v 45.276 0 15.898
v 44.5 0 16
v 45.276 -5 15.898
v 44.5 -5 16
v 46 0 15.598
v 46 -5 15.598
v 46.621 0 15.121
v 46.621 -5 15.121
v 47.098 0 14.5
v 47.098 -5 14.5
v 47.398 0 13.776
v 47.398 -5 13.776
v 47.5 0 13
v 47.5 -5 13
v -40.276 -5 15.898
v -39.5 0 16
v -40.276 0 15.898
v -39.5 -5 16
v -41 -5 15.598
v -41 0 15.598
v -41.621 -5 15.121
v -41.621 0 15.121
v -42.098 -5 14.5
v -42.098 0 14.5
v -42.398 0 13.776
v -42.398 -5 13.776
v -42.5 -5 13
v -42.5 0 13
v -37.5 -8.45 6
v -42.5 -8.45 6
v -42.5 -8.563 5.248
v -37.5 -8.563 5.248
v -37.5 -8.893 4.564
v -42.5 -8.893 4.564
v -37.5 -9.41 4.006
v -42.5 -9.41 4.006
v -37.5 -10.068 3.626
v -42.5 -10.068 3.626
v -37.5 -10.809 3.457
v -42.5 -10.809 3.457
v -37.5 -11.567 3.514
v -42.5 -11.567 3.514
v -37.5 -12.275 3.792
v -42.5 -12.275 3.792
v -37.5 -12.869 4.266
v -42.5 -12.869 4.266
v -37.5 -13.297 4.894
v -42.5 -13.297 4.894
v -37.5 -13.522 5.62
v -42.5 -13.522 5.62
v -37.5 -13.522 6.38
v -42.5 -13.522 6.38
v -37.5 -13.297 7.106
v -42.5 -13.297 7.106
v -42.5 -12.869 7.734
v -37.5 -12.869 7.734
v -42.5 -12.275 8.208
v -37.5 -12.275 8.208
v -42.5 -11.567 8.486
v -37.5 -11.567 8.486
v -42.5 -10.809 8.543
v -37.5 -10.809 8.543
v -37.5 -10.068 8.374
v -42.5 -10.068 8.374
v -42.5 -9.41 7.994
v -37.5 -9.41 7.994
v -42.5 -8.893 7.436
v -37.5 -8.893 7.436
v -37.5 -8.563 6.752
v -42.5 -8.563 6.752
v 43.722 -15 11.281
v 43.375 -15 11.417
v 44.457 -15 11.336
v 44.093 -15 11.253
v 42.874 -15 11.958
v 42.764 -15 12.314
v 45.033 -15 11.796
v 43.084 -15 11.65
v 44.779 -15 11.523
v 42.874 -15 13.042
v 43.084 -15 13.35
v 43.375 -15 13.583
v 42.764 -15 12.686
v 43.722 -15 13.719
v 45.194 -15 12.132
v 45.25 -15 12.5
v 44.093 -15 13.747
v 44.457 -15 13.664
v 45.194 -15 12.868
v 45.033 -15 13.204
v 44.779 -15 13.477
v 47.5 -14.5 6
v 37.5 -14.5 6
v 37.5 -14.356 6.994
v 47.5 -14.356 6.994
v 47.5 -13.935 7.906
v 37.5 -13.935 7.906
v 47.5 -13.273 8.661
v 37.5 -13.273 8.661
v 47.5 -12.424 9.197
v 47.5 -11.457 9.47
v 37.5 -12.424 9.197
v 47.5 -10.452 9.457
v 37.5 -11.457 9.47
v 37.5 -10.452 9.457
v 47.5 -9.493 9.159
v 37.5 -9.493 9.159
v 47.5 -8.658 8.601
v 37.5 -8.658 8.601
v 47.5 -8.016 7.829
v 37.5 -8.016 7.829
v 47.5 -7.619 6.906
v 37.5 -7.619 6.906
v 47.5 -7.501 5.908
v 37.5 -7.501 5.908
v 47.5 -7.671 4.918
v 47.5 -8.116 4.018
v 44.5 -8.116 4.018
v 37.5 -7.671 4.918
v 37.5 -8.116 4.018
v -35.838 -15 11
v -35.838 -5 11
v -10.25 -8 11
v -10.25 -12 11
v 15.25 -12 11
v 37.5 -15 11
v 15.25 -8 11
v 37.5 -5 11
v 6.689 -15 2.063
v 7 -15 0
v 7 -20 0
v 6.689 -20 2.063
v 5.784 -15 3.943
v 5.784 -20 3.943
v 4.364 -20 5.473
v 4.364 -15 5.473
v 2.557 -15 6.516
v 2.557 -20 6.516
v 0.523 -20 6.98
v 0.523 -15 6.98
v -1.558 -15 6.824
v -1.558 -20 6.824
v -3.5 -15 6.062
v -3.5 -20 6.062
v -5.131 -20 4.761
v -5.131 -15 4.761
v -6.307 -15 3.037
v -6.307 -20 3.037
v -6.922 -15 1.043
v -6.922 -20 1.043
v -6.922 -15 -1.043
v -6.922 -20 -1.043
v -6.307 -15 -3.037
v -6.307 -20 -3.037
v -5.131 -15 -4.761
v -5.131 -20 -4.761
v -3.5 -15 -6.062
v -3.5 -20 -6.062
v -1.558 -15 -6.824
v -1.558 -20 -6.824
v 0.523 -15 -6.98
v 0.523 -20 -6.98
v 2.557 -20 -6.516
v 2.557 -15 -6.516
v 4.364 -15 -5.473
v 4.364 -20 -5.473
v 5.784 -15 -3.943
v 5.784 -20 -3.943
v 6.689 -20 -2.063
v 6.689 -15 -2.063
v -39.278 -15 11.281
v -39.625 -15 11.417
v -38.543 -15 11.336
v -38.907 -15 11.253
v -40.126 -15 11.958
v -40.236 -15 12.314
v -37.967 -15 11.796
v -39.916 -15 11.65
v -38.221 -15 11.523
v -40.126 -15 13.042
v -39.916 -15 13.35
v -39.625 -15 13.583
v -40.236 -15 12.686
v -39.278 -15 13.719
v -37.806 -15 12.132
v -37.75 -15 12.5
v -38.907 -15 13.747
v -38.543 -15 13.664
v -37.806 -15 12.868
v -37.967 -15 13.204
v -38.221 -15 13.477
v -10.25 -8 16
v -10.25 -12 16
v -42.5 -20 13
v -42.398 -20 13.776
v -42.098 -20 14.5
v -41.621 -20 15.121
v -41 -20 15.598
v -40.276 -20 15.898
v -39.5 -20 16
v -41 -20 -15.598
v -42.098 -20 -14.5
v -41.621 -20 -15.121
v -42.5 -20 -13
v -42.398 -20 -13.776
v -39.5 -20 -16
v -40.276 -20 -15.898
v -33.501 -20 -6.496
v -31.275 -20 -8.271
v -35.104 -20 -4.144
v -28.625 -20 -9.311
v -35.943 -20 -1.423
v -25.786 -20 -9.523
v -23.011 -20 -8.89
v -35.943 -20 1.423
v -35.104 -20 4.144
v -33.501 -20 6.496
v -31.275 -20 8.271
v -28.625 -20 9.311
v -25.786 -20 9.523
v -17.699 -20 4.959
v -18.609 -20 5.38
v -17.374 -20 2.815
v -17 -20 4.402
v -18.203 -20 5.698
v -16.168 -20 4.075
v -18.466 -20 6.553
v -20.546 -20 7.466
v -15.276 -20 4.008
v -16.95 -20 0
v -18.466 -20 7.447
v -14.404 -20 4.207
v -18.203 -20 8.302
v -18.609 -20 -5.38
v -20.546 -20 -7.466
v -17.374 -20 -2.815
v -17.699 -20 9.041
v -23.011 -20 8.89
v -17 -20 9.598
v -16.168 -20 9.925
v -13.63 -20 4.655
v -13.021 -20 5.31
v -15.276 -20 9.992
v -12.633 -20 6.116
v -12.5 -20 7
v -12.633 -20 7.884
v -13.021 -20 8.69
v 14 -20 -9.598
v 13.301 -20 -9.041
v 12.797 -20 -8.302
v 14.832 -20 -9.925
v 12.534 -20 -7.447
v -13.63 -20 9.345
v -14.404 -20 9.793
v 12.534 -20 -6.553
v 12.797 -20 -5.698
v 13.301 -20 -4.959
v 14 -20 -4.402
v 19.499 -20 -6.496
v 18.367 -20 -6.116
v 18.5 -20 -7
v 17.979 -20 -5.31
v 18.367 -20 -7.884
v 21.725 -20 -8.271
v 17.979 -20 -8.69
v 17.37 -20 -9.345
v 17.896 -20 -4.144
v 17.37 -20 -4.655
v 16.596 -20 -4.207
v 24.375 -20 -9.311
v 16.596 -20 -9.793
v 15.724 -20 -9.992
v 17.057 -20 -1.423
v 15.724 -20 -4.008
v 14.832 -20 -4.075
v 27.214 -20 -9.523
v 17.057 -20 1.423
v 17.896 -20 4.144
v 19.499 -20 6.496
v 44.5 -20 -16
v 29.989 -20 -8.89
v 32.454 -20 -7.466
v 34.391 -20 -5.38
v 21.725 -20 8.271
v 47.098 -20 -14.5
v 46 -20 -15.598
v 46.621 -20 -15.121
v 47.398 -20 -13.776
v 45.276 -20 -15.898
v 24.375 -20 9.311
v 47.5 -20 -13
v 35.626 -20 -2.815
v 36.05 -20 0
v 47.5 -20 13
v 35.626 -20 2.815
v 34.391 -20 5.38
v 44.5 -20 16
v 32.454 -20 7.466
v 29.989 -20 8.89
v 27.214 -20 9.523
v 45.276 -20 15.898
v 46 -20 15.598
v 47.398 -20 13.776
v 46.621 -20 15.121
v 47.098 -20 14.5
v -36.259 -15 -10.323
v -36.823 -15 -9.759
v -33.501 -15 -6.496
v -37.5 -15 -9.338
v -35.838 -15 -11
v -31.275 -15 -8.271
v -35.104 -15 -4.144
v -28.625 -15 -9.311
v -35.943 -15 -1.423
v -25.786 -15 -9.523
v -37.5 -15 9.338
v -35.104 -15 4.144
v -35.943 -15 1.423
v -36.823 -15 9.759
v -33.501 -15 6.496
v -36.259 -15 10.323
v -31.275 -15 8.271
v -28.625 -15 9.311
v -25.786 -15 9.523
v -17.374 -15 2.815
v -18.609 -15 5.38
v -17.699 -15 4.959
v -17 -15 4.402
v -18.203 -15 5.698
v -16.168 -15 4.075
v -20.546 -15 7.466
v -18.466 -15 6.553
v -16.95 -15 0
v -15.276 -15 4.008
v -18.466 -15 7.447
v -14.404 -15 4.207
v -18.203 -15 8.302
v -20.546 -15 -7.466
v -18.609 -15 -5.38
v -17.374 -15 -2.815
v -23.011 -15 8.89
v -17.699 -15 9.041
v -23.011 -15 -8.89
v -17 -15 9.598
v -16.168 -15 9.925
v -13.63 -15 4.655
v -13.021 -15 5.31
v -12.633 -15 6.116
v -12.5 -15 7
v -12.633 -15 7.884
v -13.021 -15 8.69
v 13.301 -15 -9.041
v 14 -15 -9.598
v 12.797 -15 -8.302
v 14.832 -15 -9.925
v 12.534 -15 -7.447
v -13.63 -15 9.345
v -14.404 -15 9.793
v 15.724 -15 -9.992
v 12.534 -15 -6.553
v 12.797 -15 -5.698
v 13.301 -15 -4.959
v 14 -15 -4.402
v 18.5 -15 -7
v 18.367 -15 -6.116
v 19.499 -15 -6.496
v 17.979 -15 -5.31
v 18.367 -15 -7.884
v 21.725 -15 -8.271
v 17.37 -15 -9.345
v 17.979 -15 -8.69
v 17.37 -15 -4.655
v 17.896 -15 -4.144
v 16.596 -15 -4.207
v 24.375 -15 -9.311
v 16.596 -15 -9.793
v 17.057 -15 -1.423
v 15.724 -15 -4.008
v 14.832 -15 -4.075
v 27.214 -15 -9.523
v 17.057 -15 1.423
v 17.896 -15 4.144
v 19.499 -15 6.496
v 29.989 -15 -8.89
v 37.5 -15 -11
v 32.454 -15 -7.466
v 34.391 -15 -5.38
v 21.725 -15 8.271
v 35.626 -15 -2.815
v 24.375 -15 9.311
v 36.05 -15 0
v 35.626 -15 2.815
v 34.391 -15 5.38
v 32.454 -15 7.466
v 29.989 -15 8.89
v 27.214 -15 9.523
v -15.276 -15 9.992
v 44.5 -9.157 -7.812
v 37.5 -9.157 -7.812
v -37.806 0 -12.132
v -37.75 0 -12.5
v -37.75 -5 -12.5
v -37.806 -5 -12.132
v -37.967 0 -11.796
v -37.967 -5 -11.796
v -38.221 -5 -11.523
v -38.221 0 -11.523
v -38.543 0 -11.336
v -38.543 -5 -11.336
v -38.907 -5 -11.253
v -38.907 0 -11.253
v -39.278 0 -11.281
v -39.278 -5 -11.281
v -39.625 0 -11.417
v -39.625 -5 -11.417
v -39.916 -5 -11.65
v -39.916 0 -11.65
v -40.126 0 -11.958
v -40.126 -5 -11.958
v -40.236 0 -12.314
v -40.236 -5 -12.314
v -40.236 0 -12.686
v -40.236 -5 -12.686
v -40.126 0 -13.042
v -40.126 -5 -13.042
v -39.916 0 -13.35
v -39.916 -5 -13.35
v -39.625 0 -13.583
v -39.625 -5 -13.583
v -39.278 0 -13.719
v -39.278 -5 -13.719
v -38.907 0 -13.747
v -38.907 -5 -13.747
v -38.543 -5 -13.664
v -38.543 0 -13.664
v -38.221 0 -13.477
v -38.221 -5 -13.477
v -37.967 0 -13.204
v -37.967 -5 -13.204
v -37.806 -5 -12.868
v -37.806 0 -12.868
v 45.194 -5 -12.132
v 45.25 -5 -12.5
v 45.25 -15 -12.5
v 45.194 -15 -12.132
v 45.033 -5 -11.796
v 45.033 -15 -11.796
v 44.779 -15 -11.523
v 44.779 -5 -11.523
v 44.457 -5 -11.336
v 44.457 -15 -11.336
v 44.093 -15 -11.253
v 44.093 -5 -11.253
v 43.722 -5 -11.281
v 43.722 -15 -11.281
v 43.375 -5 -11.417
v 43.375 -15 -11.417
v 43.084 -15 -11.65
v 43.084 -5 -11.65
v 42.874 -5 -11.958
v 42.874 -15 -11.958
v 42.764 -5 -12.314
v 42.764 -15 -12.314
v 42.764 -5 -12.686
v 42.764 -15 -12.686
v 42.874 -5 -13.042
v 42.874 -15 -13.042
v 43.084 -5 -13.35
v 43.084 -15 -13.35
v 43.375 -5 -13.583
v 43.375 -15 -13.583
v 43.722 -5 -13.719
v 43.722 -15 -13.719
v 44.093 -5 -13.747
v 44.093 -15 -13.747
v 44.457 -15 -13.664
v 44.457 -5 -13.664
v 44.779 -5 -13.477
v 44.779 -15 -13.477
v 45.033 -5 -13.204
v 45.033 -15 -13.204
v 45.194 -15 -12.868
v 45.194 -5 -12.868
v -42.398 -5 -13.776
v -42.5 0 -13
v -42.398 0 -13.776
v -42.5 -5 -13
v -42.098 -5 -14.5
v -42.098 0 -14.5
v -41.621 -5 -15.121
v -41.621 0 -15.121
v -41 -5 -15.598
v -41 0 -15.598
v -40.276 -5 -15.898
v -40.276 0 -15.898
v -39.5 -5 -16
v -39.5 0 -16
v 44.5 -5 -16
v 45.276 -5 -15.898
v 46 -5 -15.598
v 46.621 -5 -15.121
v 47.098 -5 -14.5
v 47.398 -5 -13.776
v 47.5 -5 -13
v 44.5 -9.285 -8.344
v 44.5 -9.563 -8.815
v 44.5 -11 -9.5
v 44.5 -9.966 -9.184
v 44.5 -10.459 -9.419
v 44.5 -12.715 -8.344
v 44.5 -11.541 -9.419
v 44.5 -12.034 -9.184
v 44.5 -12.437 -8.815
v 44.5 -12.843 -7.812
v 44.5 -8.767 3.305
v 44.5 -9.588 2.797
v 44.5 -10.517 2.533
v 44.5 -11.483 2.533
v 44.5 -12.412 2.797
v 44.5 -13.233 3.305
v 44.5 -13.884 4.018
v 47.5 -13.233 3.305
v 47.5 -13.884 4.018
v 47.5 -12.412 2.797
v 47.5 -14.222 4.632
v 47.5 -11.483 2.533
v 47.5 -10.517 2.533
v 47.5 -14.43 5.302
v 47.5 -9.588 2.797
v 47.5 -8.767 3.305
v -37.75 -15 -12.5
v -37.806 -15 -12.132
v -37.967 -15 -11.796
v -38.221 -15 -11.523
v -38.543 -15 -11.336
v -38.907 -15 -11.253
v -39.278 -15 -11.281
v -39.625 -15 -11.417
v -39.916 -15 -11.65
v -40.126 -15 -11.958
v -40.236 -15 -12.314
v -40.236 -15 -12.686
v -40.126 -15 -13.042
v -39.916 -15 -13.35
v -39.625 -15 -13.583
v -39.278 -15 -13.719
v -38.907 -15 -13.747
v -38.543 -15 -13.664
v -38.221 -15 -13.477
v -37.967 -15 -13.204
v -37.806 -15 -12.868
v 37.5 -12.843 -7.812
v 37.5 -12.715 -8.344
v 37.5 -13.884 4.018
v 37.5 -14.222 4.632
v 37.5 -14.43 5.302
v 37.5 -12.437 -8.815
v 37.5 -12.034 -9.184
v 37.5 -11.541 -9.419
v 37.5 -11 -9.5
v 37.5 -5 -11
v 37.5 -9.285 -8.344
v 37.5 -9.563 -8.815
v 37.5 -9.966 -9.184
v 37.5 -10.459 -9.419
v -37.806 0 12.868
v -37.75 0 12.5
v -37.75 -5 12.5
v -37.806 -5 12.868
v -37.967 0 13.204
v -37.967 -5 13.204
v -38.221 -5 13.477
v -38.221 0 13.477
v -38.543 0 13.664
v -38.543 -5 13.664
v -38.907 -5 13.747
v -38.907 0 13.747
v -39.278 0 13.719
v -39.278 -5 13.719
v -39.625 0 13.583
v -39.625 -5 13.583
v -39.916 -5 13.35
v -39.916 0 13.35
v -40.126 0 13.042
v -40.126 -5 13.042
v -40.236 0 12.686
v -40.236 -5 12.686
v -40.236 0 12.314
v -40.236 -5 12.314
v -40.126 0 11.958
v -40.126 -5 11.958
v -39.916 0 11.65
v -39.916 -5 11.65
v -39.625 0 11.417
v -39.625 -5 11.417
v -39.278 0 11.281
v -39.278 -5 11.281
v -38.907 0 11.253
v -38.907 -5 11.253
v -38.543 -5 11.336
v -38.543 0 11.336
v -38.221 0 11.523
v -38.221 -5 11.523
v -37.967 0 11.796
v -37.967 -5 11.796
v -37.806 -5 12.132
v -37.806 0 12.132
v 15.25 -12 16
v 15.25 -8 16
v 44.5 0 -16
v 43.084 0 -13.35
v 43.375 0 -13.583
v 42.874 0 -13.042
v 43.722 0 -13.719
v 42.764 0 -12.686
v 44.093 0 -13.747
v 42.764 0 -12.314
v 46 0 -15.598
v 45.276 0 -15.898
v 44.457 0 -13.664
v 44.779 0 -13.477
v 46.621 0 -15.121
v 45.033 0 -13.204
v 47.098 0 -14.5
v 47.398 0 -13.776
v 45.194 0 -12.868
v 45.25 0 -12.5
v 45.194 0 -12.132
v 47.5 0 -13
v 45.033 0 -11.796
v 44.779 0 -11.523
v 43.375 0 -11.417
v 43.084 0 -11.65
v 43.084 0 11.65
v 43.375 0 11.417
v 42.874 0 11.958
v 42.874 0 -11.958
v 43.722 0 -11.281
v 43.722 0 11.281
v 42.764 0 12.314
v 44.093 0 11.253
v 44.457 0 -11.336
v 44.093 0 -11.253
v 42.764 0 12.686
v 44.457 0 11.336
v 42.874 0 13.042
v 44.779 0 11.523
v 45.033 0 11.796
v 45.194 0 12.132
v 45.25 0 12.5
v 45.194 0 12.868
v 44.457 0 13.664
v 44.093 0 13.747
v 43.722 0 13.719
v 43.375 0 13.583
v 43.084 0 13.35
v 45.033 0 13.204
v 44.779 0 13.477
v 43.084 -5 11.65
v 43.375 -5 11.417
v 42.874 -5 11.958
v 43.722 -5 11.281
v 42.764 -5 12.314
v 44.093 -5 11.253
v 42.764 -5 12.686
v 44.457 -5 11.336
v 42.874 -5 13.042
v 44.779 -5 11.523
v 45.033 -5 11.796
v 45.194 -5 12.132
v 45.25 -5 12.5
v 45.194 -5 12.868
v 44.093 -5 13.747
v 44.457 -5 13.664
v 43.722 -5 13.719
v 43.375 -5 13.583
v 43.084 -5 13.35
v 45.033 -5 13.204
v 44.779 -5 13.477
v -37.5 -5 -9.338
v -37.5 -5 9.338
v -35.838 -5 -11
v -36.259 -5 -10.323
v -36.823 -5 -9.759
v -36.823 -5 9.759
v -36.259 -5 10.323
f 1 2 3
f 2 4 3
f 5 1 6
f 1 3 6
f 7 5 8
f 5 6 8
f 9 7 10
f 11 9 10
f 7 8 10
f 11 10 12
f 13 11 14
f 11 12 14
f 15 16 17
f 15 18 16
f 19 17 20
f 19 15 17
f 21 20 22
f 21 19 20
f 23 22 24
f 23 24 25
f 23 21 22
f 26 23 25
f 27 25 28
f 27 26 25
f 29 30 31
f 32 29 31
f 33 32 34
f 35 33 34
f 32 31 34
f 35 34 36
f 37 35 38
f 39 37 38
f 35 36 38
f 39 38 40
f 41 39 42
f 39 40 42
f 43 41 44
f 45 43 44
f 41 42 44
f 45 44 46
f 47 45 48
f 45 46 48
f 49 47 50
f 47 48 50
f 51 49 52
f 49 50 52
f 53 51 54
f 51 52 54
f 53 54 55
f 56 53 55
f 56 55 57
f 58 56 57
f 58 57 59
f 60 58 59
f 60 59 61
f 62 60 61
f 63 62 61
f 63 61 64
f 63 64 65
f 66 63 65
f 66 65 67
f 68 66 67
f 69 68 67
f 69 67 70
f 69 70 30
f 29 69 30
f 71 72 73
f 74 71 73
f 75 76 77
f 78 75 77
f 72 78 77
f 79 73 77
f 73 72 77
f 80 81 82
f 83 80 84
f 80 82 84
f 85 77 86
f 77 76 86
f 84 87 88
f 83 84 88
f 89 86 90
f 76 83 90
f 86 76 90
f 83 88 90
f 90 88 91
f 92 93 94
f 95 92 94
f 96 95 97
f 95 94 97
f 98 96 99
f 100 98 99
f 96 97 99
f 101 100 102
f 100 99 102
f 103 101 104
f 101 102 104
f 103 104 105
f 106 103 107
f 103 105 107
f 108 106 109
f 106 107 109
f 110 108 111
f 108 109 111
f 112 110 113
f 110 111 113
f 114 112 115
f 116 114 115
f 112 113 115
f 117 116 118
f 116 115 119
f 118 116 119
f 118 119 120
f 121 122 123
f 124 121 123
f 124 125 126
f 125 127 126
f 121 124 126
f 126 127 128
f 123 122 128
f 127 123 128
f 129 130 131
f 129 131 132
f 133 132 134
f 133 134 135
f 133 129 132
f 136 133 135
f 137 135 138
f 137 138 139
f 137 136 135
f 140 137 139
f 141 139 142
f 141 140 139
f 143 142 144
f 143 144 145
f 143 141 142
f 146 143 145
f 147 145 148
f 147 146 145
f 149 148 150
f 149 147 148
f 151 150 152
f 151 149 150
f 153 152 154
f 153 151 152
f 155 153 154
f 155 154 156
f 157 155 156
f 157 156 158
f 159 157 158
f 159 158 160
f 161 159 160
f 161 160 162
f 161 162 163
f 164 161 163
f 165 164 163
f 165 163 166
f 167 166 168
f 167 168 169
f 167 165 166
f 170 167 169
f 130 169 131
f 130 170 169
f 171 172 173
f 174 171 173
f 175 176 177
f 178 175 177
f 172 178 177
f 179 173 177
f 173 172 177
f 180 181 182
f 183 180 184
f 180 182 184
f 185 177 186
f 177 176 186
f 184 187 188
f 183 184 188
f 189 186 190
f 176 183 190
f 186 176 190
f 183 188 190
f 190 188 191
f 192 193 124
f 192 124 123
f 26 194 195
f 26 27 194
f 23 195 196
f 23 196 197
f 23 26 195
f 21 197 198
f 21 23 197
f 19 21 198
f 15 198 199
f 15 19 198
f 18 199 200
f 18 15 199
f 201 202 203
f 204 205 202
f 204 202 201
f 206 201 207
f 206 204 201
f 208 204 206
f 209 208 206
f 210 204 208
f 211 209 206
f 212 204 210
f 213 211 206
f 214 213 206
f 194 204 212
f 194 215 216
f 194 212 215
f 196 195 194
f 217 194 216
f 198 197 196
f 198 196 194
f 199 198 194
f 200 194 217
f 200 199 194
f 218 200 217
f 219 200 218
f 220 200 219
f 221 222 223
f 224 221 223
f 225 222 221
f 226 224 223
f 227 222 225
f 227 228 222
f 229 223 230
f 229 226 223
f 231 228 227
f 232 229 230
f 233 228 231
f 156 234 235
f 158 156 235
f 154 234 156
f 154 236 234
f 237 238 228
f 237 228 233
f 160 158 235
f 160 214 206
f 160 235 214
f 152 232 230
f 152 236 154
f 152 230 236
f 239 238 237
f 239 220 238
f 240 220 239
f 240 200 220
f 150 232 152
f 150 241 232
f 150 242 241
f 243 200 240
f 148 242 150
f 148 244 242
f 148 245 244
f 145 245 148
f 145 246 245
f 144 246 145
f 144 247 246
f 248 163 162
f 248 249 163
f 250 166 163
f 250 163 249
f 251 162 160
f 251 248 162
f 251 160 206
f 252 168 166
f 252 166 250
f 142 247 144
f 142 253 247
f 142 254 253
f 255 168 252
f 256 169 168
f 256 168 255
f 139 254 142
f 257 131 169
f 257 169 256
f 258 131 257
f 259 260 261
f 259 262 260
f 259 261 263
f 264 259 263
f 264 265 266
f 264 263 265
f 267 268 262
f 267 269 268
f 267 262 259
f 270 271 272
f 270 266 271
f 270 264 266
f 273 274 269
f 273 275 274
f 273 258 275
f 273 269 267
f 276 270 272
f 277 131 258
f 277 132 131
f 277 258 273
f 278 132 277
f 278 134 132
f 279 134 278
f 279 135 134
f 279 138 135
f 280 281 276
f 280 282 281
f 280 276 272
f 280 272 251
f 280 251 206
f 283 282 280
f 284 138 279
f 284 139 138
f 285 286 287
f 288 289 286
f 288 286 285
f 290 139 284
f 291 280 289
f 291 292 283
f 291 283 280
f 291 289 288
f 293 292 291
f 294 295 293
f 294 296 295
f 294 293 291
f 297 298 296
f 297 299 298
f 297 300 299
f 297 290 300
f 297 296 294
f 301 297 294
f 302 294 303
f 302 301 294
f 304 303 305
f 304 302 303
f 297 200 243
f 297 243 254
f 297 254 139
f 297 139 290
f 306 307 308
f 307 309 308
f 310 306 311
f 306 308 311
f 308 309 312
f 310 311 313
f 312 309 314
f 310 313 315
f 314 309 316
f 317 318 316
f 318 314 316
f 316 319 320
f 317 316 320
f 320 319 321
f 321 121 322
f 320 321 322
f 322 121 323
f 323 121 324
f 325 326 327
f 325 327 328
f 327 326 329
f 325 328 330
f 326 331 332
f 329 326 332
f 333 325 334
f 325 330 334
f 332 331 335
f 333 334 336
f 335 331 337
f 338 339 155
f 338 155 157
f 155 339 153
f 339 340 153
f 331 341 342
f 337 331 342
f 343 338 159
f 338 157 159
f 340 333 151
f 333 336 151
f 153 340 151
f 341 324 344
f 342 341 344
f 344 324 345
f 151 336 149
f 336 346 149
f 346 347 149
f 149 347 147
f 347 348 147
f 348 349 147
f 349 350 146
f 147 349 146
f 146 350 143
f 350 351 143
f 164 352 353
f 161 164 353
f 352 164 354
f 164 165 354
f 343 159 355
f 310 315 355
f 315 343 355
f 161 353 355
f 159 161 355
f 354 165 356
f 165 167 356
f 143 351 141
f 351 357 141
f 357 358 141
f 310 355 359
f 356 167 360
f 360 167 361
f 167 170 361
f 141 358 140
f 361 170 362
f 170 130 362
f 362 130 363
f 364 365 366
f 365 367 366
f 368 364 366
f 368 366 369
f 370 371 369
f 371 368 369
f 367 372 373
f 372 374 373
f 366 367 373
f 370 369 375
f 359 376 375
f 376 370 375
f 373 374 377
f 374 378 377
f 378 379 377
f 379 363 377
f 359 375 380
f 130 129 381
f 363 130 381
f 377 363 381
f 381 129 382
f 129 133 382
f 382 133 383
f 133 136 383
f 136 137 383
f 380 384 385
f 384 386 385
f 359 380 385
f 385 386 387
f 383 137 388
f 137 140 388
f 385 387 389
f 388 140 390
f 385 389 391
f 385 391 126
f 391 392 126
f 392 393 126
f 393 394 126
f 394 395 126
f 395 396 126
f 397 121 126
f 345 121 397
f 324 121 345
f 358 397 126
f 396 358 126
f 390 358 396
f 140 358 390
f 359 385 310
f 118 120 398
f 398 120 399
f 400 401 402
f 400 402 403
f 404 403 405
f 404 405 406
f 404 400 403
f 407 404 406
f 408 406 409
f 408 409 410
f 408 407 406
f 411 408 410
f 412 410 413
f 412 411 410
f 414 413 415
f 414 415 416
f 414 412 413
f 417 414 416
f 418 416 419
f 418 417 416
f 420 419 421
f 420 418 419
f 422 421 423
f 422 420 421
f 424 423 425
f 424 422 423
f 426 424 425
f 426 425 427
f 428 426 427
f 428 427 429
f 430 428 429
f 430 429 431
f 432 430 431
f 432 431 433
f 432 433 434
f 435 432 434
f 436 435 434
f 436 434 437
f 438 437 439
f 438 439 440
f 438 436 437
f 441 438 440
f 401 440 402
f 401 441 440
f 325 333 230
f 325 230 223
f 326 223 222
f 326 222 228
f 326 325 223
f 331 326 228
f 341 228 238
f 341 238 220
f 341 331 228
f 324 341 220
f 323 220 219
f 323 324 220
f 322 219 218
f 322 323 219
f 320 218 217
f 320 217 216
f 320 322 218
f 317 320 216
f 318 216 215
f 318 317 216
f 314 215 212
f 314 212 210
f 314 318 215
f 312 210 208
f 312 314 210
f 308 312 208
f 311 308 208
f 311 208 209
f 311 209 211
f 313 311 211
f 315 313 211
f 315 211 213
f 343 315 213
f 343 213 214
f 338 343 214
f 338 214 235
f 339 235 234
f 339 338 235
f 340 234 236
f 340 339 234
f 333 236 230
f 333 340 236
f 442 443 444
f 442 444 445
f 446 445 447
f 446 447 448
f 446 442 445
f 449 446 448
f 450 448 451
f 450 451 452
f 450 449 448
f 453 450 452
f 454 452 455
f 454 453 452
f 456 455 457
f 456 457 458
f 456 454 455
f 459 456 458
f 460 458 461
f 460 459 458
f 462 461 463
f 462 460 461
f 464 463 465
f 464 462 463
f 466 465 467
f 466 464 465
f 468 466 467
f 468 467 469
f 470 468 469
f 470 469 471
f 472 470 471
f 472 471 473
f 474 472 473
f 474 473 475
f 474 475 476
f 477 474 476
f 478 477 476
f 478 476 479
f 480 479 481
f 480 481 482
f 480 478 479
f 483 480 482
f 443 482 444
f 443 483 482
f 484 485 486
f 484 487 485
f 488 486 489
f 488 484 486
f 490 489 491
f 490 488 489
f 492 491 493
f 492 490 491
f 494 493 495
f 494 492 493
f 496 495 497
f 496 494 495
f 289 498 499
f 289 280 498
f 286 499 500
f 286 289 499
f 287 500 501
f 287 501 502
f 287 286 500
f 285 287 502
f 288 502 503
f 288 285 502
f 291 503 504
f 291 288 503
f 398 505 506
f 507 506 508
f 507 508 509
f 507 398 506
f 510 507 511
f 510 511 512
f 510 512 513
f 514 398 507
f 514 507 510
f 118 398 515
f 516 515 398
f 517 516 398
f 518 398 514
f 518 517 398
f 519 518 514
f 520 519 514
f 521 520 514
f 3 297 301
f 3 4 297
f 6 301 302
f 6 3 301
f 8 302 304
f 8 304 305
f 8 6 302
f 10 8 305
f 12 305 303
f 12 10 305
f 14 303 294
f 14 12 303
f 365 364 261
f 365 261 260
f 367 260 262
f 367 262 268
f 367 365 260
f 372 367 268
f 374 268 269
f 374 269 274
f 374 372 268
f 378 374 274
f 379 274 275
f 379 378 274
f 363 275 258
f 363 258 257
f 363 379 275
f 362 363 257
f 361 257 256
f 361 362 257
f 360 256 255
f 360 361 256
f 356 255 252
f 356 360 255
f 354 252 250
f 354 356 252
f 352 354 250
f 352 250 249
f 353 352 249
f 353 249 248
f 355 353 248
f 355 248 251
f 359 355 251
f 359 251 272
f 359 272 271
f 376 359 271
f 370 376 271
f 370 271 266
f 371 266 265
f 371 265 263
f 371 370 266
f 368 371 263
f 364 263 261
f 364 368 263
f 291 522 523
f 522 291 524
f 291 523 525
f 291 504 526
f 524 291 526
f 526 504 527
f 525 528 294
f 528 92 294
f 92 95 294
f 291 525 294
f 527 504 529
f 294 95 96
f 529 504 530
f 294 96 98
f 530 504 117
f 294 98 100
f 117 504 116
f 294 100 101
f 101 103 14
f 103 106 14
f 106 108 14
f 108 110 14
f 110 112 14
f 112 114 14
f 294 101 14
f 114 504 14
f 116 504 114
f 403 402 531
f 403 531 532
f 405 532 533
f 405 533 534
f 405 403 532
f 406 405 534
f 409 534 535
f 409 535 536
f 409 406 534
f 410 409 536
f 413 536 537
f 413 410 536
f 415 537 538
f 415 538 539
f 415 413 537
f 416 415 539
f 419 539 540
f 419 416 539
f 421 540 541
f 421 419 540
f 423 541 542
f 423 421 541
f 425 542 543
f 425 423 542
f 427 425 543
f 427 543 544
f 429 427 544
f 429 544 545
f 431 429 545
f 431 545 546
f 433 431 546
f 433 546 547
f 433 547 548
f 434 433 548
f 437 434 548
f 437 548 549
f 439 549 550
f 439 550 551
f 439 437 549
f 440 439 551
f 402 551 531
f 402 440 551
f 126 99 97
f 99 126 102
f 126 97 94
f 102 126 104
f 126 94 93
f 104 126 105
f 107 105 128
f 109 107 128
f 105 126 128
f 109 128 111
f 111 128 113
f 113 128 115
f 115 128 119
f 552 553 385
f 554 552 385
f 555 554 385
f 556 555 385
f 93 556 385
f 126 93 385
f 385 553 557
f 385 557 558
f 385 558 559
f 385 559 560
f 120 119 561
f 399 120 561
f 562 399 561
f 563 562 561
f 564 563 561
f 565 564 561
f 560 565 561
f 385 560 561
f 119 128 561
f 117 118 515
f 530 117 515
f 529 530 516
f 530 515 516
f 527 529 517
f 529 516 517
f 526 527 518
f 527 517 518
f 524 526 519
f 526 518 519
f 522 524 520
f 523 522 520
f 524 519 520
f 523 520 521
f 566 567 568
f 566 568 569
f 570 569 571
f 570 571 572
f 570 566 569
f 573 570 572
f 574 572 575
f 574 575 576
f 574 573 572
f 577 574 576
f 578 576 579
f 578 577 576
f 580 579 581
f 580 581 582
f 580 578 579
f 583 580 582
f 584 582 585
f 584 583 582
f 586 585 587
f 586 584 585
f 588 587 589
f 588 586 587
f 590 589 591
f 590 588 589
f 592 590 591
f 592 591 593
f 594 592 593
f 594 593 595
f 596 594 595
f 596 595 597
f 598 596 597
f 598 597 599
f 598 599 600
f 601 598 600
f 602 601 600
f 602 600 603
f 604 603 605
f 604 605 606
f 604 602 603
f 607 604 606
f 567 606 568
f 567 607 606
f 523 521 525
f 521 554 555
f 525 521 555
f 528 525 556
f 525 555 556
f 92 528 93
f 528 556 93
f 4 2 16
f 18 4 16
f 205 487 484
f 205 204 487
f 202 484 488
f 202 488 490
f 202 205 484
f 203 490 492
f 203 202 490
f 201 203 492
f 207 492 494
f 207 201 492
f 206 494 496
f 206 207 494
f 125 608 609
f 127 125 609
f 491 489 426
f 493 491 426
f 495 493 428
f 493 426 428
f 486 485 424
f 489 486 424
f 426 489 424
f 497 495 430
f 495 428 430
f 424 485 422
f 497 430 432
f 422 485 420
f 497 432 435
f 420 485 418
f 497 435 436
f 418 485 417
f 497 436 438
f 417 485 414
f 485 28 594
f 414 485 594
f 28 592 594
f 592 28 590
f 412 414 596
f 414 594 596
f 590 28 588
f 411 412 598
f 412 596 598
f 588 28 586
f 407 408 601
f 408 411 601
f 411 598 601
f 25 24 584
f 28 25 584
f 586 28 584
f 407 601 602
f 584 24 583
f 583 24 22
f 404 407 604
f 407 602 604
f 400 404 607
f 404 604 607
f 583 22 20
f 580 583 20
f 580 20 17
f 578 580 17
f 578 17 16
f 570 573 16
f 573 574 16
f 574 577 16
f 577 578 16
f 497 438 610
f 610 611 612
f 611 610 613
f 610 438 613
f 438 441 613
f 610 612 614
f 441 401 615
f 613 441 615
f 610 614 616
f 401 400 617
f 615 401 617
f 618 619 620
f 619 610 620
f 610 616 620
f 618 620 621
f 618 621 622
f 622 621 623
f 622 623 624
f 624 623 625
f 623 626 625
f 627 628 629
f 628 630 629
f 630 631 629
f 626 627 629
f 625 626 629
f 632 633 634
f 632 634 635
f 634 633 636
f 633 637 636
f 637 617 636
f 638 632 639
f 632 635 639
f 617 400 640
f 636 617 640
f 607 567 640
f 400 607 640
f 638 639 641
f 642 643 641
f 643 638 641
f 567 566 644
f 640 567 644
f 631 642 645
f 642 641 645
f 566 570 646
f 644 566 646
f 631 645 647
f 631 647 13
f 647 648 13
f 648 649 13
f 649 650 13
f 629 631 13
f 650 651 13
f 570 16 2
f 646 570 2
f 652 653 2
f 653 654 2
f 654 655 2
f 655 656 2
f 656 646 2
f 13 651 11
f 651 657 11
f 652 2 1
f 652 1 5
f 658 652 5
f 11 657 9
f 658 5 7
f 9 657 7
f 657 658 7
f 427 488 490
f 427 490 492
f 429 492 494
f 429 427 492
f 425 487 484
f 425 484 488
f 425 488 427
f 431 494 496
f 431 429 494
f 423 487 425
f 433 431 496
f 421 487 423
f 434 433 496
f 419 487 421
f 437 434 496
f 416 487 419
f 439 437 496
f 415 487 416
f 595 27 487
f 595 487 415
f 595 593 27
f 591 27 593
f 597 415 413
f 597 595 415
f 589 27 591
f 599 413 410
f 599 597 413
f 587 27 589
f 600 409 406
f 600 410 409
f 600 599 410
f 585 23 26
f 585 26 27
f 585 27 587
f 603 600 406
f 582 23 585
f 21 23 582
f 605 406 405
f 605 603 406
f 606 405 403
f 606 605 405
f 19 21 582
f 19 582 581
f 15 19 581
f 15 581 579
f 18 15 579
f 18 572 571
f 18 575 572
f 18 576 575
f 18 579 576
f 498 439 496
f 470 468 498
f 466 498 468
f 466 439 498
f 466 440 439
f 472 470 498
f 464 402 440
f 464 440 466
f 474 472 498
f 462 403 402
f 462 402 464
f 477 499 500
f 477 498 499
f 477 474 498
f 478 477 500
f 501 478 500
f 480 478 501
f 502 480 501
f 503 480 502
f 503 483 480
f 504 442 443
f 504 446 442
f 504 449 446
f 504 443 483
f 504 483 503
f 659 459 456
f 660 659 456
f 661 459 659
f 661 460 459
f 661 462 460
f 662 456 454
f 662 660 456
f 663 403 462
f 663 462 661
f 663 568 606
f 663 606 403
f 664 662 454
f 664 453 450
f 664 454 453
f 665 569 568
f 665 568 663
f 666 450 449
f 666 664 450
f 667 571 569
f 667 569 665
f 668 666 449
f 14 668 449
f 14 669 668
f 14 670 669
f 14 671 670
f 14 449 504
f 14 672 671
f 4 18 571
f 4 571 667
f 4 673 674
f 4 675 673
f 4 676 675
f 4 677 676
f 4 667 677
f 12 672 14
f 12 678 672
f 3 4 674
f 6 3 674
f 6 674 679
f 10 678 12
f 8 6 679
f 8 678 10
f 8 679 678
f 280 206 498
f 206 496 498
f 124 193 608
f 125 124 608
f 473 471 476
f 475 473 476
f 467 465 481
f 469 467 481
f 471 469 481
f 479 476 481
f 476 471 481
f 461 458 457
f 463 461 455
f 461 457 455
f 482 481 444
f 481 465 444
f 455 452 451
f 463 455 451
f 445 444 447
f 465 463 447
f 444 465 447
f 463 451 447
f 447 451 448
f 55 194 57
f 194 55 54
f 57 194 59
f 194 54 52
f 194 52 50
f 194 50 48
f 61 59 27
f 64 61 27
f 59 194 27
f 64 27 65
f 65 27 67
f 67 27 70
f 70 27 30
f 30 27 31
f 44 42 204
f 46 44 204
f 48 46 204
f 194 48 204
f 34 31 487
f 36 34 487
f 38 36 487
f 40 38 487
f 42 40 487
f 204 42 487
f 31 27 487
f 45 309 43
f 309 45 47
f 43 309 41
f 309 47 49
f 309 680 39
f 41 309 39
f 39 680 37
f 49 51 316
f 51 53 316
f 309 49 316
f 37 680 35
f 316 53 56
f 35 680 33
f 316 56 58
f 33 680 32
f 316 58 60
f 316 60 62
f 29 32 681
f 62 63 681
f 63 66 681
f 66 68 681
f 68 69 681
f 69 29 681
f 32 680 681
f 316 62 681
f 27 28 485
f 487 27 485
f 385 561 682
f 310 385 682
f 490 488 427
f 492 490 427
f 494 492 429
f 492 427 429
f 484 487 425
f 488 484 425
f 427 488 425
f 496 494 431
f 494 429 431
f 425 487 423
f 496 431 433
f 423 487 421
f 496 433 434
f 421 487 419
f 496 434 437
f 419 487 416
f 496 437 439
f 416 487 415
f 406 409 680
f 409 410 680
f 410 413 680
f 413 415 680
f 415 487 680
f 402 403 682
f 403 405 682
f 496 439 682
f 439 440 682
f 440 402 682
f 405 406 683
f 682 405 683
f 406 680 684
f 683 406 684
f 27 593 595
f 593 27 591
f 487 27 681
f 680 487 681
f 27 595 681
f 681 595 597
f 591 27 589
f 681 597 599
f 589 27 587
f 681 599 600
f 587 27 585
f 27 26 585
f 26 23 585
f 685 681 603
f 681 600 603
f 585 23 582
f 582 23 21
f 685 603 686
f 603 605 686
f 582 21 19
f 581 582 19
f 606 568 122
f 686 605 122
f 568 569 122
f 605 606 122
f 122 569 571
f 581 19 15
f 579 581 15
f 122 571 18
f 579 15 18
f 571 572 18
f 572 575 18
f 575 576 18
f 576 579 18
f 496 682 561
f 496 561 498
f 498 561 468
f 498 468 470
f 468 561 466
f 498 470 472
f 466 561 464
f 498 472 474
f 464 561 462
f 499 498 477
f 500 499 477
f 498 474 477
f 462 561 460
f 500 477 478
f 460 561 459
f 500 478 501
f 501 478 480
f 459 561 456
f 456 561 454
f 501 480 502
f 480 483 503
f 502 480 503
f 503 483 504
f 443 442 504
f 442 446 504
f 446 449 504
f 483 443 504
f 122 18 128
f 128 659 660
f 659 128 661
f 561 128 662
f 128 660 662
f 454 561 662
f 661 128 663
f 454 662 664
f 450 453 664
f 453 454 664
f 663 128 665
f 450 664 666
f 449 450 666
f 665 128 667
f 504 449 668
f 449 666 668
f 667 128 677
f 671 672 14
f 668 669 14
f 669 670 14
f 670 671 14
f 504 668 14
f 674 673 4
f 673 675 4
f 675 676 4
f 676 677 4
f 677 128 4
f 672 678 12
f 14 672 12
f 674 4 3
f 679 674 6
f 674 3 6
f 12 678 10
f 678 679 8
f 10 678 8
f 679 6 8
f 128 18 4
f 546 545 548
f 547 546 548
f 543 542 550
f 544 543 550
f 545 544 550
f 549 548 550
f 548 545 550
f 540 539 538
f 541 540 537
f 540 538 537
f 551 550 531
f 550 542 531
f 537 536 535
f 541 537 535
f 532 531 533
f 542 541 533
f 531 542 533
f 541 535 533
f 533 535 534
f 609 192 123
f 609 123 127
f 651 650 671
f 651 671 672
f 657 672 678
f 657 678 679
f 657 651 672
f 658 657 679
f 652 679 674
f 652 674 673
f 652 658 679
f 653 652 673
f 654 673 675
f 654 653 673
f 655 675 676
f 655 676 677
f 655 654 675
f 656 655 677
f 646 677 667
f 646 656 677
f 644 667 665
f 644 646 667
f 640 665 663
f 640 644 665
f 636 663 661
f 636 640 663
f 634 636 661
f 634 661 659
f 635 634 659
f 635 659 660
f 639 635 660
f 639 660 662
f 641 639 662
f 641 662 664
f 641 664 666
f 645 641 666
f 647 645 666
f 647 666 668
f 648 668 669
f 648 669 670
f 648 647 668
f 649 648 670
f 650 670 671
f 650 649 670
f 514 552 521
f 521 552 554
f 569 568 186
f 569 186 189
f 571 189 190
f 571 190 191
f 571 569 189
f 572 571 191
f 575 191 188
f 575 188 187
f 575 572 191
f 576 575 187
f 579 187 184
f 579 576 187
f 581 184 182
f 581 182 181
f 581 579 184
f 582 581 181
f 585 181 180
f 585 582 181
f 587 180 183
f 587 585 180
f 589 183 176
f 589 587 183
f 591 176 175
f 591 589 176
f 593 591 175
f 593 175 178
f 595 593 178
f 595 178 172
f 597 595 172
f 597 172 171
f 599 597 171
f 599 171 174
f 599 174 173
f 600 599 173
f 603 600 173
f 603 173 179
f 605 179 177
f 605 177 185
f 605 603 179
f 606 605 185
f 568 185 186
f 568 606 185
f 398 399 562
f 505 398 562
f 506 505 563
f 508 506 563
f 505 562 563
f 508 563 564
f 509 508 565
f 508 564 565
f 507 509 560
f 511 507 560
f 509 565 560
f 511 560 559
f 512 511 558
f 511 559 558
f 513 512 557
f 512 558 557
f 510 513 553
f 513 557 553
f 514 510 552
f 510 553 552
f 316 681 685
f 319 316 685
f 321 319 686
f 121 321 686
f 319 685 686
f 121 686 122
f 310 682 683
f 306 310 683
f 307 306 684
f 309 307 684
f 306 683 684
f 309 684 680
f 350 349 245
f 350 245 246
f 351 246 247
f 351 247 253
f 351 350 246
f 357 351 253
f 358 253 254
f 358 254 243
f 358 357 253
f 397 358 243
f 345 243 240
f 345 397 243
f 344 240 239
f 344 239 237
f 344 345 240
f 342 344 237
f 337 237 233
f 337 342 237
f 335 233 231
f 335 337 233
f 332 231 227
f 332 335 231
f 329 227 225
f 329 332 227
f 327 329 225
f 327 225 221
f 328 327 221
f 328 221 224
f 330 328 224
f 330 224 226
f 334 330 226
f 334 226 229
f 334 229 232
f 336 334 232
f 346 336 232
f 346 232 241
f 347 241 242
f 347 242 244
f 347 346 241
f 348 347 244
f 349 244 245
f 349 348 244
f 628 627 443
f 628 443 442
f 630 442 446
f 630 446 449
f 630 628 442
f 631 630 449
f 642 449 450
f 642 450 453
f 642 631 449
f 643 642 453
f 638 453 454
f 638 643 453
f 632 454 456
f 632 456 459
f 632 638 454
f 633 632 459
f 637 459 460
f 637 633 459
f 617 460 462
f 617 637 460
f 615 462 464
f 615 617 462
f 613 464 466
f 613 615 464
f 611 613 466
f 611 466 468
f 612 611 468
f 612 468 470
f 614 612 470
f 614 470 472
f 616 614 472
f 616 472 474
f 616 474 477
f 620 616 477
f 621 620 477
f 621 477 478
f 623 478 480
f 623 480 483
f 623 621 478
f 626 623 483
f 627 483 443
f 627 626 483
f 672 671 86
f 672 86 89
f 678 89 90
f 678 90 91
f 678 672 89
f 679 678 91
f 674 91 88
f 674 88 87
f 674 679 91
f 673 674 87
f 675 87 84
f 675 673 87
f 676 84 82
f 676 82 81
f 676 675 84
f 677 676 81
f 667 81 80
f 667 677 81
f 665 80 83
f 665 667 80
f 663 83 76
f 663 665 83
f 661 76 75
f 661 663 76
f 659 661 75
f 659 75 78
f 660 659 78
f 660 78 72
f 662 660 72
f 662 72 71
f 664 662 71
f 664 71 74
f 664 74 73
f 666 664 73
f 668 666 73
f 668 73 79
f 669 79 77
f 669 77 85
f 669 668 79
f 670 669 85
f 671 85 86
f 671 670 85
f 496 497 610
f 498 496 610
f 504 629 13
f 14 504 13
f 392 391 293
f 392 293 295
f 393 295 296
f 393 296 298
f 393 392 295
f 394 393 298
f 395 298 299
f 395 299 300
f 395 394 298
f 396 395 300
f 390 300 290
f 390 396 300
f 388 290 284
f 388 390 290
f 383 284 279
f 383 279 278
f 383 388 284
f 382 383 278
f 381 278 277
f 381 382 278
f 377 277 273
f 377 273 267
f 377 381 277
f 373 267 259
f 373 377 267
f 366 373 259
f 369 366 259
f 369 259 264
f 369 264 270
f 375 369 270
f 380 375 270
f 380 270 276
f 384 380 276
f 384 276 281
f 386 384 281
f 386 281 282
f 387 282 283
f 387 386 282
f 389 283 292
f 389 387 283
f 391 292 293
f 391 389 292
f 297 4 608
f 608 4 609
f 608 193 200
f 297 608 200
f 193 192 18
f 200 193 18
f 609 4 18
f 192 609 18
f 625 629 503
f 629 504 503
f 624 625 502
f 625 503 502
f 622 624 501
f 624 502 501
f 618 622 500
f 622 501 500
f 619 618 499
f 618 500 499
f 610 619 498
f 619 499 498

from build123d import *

# Parameters (mm, degrees)
F0_R      = 1.25
F1_DEPTH  = 5
F2_R      = 1.25
F3_DEPTH  = 10
F4_R      = 3
F4_R_2    = 9.55
F4_R_3    = 7
F5_DEPTH  = 5
F6_W      = 25.5
F6_H      = 4
F7_DEPTH  = 5
F8_R      = 3
F8_2_R    = 3
F10_DEPTH = 10
F11_DEPTH = 7
F12_D     = 5.1


# Not quite as in the source:
# - a feature names something its author has since deleted; it is built from what else it names


with BuildPart() as f1:
    # F0 (on Front) → F1 (new body)
    with BuildSketch(Plane.XZ):
        Polygon((47.5, 16), (42.5, 16), (-42.5, 16), (-42.5, -16), (42.5, -16), (47.5, -16), align=None)
        with Locations((-39, -12.5)):
            Circle(F0_R, mode=Mode.SUBTRACT)
        with Locations((44, -12.5)):
            Circle(F0_R, mode=Mode.SUBTRACT)
        with Locations((-39, 12.5)):
            Circle(F0_R, mode=Mode.SUBTRACT)
        with Locations((44, 12.5)):
            Circle(F0_R, mode=Mode.SUBTRACT)
    extrude(amount=F1_DEPTH)

    # F8#2
    f8_2_edges = [f1.edges().sort_by_distance(p)[0] for p in [
        (47.5, -2.5, 16),
        (47.5, -2.5, -16),
        (-42.5, -2.5, 16),
        (-42.5, -2.5, -16),
    ]]
    fillet(f8_2_edges, radius=F8_2_R)


with BuildPart() as f3:
    # F2 (on face) → F3 (new body)
    with BuildSketch(Plane.XZ.offset(5)):
        with BuildLine():
            ThreePointArc((-37.5, 9.3377223398), (-40.8708286934, 9.5419601085), (-42.5, 12.5))
            Line((-42.5, 12.5), (-42.5, -12.5))
            ThreePointArc((-42.5, -12.5), (-40.8708286934, -9.5419601085), (-37.5, -9.3377223398))
            Line((-37.5, -9.3377223398), (-37.5, 9.3377223398))
        make_face()
        with BuildLine():
            ThreePointArc((-35.5, 12.5), (-36.5251262658, 14.9748737342), (-39, 16))
            ThreePointArc((-39, 16), (-41.4748737342, 14.9748737342), (-42.5, 12.5))
            ThreePointArc((-42.5, 12.5), (-40.8708286934, 9.5419601085), (-37.5, 9.3377223398))
            Line((-37.5, 9.3377223398), (-37.5, 11))
            Line((-37.5, 11), (-35.8377223398, 11))
            ThreePointArc((-35.8377223398, 11), (-35.5854742781, 11.7312255892), (-35.5, 12.5))
        make_face()
        with Locations((-39, 12.5)):
            Circle(F2_R, mode=Mode.SUBTRACT)
        with BuildLine():
            Line((-39, 16), (-42.5, 16))
            Line((-42.5, 16), (-42.5, 12.5))
            ThreePointArc((-42.5, 12.5), (-41.4748737342, 14.9748737342), (-39, 16))
        make_face()
        with BuildLine():
            ThreePointArc((-39, -16), (-41.4748737342, -14.9748737342), (-42.5, -12.5))
            Line((-42.5, -12.5), (-42.5, -16))
            Line((-42.5, -16), (-39, -16))
        make_face()
        with BuildLine():
            ThreePointArc((-37.5, -9.3377223398), (-40.8708286934, -9.5419601085), (-42.5, -12.5))
            ThreePointArc((-42.5, -12.5), (-41.4748737342, -14.9748737342), (-39, -16))
            ThreePointArc((-39, -16), (-36.5251262658, -14.9748737342), (-35.5, -12.5))
            ThreePointArc((-35.5, -12.5), (-35.5854742781, -11.7312255892), (-35.8377223398, -11))
            Line((-35.8377223398, -11), (-37.5, -11))
            Line((-37.5, -11), (-37.5, -9.3377223398))
        make_face()
        with Locations((-39, -12.5)):
            Circle(F2_R, mode=Mode.SUBTRACT)
        with BuildLine():
            Line((42.5, 16), (-39, 16))
            ThreePointArc((-39, 16), (-36.5251262658, 14.9748737342), (-35.5, 12.5))
            ThreePointArc((-35.5, 12.5), (-35.5854742781, 11.7312255892), (-35.8377223398, 11))
            Line((-35.8377223398, 11), (37.5, 11))
            Line((37.5, 11), (37.5, -11))
            Line((37.5, -11), (-35.8377223398, -11))
            ThreePointArc((-35.8377223398, -11), (-35.5854742781, -11.7312255892), (-35.5, -12.5))
            ThreePointArc((-35.5, -12.5), (-36.5251262658, -14.9748737342), (-39, -16))
            Line((-39, -16), (42.5, -16))
            Line((42.5, -16), (47.5, -16))
            Line((47.5, -16), (47.5, 16))
            Line((47.5, 16), (42.5, 16))
        make_face()
        with Locations((44, -12.5)):
            Circle(F2_R, mode=Mode.SUBTRACT)
        with Locations((44, 12.5)):
            Circle(F2_R, mode=Mode.SUBTRACT)
        with BuildLine():
            Line((-37.5, 11), (-37.5, 9.3377223398))
            ThreePointArc((-37.5, 9.3377223398), (-36.5251262658, 10.0251262658), (-35.8377223398, 11))
            Line((-35.8377223398, 11), (-37.5, 11))
        make_face()
        with BuildLine():
            ThreePointArc((-35.8377223398, -11), (-36.5251262658, -10.0251262658), (-37.5, -9.3377223398))
            Line((-37.5, -9.3377223398), (-37.5, -11))
            Line((-37.5, -11), (-35.8377223398, -11))
        make_face()
    extrude(amount=F3_DEPTH)

    # F4 (on face) → F5 (join)
    with BuildSketch(Plane.XZ.offset(15)):
        Polygon((42.5, 16), (-42.5, 16), (-42.5, -16), (42.5, -16), (47.5, -16), (47.5, 16), align=None)
        with Locations((15.5, -7)):
            Circle(F4_R, mode=Mode.SUBTRACT)
        with Locations((-26.5, 0)):
            Circle(F4_R_2, mode=Mode.SUBTRACT)
        Circle(F4_R_3, mode=Mode.SUBTRACT)
        with Locations((-15.5, 7)):
            Circle(F4_R, mode=Mode.SUBTRACT)
        with Locations((26.5, 0)):
            Circle(F4_R_2, mode=Mode.SUBTRACT)
    extrude(amount=F5_DEPTH)

    # F6 (on face) → F7 (cut)
    with BuildSketch(Plane.XY.offset(16)):
        with Locations((2.5, -10)):
            Rectangle(F6_W, F6_H)
    extrude(amount=-F7_DEPTH, mode=Mode.SUBTRACT)

    # F8
    f8_edges = [f3.edges().sort_by_distance(p)[0] for p in [
        (47.5, -12.5, 16),
        (47.5, -12.5, -16),
        (-42.5, -12.5, 16),
        (-42.5, -12.5, -16),
    ]]
    fillet(f8_edges, radius=F8_R)

    # F9 (on face) → F10 (cut, through all)
    with BuildSketch(Plane(origin=(37.5, 0, 0), x_dir=(0, -1, 0), z_dir=(-1, 0, 0))):
        with BuildLine():
            ThreePointArc((13.8844104576, 4.0175327715), (14.3425616376, 4.9620781825), (14.5, 6))
            ThreePointArc((14.5, 6), (9.9620781825, 9.3425616376), (8.1155895424, 4.0175327715))
            ThreePointArc((8.1155895424, 4.0175327715), (11, 2.5), (13.8844104576, 4.0175327715))
        make_face()
    extrude(amount=-F10_DEPTH, mode=Mode.SUBTRACT)

    # F9 (on face) → F11 (cut)
    with BuildSketch(Plane(origin=(37.5, 0, 0), x_dir=(0, -1, 0), z_dir=(-1, 0, 0))):
        with BuildLine():
            ThreePointArc((13.8844104576, 4.0175327715), (14.3425616376, 4.9620781825), (14.5, 6))
            ThreePointArc((14.5, 6), (9.9620781825, 9.3425616376), (8.1155895424, 4.0175327715))
            ThreePointArc((8.1155895424, 4.0175327715), (11, 2.5), (13.8844104576, 4.0175327715))
        make_face()
        with BuildLine():
            ThreePointArc((13.8844104576, 4.0175327715), (11, 2.5), (8.1155895424, 4.0175327715))
            Line((8.1155895424, 4.0175327715), (9.1571289137, -7.8122533804))
            ThreePointArc((9.1571289137, -7.8122533804), (10.9187950419, -5.8017830877), (12.85, -7.65))
            ThreePointArc((12.85, -7.65), (12.8482169123, -7.7312049581), (12.8428710863, -7.8122533804))
            Line((12.8428710863, -7.8122533804), (13.8844104576, 4.0175327715))
        make_face()
        with BuildLine():
            Line((12.8428710863, -7.8122533804), (9.1571289137, -7.8122533804))
            ThreePointArc((9.1571289137, -7.8122533804), (11, -9.5), (12.8428710863, -7.8122533804))
        make_face()
        with BuildLine():
            ThreePointArc((12.85, -7.65), (10.9187950419, -5.8017830877), (9.1571289137, -7.8122533804))
            Line((9.1571289137, -7.8122533804), (12.8428710863, -7.8122533804))
            ThreePointArc((12.8428710863, -7.8122533804), (12.8482169123, -7.7312049581), (12.85, -7.65))
        make_face()
    extrude(amount=-F11_DEPTH, mode=Mode.SUBTRACT)

    # F12 (through all)
    with Locations(Plane(origin=(37.5, 0, 0), x_dir=(0, -1, 0), z_dir=(1, 0, 0))):
        with Locations((11, -6)):
            Hole(F12_D / 2)


solid = Compound([f1.part, f3.part])
